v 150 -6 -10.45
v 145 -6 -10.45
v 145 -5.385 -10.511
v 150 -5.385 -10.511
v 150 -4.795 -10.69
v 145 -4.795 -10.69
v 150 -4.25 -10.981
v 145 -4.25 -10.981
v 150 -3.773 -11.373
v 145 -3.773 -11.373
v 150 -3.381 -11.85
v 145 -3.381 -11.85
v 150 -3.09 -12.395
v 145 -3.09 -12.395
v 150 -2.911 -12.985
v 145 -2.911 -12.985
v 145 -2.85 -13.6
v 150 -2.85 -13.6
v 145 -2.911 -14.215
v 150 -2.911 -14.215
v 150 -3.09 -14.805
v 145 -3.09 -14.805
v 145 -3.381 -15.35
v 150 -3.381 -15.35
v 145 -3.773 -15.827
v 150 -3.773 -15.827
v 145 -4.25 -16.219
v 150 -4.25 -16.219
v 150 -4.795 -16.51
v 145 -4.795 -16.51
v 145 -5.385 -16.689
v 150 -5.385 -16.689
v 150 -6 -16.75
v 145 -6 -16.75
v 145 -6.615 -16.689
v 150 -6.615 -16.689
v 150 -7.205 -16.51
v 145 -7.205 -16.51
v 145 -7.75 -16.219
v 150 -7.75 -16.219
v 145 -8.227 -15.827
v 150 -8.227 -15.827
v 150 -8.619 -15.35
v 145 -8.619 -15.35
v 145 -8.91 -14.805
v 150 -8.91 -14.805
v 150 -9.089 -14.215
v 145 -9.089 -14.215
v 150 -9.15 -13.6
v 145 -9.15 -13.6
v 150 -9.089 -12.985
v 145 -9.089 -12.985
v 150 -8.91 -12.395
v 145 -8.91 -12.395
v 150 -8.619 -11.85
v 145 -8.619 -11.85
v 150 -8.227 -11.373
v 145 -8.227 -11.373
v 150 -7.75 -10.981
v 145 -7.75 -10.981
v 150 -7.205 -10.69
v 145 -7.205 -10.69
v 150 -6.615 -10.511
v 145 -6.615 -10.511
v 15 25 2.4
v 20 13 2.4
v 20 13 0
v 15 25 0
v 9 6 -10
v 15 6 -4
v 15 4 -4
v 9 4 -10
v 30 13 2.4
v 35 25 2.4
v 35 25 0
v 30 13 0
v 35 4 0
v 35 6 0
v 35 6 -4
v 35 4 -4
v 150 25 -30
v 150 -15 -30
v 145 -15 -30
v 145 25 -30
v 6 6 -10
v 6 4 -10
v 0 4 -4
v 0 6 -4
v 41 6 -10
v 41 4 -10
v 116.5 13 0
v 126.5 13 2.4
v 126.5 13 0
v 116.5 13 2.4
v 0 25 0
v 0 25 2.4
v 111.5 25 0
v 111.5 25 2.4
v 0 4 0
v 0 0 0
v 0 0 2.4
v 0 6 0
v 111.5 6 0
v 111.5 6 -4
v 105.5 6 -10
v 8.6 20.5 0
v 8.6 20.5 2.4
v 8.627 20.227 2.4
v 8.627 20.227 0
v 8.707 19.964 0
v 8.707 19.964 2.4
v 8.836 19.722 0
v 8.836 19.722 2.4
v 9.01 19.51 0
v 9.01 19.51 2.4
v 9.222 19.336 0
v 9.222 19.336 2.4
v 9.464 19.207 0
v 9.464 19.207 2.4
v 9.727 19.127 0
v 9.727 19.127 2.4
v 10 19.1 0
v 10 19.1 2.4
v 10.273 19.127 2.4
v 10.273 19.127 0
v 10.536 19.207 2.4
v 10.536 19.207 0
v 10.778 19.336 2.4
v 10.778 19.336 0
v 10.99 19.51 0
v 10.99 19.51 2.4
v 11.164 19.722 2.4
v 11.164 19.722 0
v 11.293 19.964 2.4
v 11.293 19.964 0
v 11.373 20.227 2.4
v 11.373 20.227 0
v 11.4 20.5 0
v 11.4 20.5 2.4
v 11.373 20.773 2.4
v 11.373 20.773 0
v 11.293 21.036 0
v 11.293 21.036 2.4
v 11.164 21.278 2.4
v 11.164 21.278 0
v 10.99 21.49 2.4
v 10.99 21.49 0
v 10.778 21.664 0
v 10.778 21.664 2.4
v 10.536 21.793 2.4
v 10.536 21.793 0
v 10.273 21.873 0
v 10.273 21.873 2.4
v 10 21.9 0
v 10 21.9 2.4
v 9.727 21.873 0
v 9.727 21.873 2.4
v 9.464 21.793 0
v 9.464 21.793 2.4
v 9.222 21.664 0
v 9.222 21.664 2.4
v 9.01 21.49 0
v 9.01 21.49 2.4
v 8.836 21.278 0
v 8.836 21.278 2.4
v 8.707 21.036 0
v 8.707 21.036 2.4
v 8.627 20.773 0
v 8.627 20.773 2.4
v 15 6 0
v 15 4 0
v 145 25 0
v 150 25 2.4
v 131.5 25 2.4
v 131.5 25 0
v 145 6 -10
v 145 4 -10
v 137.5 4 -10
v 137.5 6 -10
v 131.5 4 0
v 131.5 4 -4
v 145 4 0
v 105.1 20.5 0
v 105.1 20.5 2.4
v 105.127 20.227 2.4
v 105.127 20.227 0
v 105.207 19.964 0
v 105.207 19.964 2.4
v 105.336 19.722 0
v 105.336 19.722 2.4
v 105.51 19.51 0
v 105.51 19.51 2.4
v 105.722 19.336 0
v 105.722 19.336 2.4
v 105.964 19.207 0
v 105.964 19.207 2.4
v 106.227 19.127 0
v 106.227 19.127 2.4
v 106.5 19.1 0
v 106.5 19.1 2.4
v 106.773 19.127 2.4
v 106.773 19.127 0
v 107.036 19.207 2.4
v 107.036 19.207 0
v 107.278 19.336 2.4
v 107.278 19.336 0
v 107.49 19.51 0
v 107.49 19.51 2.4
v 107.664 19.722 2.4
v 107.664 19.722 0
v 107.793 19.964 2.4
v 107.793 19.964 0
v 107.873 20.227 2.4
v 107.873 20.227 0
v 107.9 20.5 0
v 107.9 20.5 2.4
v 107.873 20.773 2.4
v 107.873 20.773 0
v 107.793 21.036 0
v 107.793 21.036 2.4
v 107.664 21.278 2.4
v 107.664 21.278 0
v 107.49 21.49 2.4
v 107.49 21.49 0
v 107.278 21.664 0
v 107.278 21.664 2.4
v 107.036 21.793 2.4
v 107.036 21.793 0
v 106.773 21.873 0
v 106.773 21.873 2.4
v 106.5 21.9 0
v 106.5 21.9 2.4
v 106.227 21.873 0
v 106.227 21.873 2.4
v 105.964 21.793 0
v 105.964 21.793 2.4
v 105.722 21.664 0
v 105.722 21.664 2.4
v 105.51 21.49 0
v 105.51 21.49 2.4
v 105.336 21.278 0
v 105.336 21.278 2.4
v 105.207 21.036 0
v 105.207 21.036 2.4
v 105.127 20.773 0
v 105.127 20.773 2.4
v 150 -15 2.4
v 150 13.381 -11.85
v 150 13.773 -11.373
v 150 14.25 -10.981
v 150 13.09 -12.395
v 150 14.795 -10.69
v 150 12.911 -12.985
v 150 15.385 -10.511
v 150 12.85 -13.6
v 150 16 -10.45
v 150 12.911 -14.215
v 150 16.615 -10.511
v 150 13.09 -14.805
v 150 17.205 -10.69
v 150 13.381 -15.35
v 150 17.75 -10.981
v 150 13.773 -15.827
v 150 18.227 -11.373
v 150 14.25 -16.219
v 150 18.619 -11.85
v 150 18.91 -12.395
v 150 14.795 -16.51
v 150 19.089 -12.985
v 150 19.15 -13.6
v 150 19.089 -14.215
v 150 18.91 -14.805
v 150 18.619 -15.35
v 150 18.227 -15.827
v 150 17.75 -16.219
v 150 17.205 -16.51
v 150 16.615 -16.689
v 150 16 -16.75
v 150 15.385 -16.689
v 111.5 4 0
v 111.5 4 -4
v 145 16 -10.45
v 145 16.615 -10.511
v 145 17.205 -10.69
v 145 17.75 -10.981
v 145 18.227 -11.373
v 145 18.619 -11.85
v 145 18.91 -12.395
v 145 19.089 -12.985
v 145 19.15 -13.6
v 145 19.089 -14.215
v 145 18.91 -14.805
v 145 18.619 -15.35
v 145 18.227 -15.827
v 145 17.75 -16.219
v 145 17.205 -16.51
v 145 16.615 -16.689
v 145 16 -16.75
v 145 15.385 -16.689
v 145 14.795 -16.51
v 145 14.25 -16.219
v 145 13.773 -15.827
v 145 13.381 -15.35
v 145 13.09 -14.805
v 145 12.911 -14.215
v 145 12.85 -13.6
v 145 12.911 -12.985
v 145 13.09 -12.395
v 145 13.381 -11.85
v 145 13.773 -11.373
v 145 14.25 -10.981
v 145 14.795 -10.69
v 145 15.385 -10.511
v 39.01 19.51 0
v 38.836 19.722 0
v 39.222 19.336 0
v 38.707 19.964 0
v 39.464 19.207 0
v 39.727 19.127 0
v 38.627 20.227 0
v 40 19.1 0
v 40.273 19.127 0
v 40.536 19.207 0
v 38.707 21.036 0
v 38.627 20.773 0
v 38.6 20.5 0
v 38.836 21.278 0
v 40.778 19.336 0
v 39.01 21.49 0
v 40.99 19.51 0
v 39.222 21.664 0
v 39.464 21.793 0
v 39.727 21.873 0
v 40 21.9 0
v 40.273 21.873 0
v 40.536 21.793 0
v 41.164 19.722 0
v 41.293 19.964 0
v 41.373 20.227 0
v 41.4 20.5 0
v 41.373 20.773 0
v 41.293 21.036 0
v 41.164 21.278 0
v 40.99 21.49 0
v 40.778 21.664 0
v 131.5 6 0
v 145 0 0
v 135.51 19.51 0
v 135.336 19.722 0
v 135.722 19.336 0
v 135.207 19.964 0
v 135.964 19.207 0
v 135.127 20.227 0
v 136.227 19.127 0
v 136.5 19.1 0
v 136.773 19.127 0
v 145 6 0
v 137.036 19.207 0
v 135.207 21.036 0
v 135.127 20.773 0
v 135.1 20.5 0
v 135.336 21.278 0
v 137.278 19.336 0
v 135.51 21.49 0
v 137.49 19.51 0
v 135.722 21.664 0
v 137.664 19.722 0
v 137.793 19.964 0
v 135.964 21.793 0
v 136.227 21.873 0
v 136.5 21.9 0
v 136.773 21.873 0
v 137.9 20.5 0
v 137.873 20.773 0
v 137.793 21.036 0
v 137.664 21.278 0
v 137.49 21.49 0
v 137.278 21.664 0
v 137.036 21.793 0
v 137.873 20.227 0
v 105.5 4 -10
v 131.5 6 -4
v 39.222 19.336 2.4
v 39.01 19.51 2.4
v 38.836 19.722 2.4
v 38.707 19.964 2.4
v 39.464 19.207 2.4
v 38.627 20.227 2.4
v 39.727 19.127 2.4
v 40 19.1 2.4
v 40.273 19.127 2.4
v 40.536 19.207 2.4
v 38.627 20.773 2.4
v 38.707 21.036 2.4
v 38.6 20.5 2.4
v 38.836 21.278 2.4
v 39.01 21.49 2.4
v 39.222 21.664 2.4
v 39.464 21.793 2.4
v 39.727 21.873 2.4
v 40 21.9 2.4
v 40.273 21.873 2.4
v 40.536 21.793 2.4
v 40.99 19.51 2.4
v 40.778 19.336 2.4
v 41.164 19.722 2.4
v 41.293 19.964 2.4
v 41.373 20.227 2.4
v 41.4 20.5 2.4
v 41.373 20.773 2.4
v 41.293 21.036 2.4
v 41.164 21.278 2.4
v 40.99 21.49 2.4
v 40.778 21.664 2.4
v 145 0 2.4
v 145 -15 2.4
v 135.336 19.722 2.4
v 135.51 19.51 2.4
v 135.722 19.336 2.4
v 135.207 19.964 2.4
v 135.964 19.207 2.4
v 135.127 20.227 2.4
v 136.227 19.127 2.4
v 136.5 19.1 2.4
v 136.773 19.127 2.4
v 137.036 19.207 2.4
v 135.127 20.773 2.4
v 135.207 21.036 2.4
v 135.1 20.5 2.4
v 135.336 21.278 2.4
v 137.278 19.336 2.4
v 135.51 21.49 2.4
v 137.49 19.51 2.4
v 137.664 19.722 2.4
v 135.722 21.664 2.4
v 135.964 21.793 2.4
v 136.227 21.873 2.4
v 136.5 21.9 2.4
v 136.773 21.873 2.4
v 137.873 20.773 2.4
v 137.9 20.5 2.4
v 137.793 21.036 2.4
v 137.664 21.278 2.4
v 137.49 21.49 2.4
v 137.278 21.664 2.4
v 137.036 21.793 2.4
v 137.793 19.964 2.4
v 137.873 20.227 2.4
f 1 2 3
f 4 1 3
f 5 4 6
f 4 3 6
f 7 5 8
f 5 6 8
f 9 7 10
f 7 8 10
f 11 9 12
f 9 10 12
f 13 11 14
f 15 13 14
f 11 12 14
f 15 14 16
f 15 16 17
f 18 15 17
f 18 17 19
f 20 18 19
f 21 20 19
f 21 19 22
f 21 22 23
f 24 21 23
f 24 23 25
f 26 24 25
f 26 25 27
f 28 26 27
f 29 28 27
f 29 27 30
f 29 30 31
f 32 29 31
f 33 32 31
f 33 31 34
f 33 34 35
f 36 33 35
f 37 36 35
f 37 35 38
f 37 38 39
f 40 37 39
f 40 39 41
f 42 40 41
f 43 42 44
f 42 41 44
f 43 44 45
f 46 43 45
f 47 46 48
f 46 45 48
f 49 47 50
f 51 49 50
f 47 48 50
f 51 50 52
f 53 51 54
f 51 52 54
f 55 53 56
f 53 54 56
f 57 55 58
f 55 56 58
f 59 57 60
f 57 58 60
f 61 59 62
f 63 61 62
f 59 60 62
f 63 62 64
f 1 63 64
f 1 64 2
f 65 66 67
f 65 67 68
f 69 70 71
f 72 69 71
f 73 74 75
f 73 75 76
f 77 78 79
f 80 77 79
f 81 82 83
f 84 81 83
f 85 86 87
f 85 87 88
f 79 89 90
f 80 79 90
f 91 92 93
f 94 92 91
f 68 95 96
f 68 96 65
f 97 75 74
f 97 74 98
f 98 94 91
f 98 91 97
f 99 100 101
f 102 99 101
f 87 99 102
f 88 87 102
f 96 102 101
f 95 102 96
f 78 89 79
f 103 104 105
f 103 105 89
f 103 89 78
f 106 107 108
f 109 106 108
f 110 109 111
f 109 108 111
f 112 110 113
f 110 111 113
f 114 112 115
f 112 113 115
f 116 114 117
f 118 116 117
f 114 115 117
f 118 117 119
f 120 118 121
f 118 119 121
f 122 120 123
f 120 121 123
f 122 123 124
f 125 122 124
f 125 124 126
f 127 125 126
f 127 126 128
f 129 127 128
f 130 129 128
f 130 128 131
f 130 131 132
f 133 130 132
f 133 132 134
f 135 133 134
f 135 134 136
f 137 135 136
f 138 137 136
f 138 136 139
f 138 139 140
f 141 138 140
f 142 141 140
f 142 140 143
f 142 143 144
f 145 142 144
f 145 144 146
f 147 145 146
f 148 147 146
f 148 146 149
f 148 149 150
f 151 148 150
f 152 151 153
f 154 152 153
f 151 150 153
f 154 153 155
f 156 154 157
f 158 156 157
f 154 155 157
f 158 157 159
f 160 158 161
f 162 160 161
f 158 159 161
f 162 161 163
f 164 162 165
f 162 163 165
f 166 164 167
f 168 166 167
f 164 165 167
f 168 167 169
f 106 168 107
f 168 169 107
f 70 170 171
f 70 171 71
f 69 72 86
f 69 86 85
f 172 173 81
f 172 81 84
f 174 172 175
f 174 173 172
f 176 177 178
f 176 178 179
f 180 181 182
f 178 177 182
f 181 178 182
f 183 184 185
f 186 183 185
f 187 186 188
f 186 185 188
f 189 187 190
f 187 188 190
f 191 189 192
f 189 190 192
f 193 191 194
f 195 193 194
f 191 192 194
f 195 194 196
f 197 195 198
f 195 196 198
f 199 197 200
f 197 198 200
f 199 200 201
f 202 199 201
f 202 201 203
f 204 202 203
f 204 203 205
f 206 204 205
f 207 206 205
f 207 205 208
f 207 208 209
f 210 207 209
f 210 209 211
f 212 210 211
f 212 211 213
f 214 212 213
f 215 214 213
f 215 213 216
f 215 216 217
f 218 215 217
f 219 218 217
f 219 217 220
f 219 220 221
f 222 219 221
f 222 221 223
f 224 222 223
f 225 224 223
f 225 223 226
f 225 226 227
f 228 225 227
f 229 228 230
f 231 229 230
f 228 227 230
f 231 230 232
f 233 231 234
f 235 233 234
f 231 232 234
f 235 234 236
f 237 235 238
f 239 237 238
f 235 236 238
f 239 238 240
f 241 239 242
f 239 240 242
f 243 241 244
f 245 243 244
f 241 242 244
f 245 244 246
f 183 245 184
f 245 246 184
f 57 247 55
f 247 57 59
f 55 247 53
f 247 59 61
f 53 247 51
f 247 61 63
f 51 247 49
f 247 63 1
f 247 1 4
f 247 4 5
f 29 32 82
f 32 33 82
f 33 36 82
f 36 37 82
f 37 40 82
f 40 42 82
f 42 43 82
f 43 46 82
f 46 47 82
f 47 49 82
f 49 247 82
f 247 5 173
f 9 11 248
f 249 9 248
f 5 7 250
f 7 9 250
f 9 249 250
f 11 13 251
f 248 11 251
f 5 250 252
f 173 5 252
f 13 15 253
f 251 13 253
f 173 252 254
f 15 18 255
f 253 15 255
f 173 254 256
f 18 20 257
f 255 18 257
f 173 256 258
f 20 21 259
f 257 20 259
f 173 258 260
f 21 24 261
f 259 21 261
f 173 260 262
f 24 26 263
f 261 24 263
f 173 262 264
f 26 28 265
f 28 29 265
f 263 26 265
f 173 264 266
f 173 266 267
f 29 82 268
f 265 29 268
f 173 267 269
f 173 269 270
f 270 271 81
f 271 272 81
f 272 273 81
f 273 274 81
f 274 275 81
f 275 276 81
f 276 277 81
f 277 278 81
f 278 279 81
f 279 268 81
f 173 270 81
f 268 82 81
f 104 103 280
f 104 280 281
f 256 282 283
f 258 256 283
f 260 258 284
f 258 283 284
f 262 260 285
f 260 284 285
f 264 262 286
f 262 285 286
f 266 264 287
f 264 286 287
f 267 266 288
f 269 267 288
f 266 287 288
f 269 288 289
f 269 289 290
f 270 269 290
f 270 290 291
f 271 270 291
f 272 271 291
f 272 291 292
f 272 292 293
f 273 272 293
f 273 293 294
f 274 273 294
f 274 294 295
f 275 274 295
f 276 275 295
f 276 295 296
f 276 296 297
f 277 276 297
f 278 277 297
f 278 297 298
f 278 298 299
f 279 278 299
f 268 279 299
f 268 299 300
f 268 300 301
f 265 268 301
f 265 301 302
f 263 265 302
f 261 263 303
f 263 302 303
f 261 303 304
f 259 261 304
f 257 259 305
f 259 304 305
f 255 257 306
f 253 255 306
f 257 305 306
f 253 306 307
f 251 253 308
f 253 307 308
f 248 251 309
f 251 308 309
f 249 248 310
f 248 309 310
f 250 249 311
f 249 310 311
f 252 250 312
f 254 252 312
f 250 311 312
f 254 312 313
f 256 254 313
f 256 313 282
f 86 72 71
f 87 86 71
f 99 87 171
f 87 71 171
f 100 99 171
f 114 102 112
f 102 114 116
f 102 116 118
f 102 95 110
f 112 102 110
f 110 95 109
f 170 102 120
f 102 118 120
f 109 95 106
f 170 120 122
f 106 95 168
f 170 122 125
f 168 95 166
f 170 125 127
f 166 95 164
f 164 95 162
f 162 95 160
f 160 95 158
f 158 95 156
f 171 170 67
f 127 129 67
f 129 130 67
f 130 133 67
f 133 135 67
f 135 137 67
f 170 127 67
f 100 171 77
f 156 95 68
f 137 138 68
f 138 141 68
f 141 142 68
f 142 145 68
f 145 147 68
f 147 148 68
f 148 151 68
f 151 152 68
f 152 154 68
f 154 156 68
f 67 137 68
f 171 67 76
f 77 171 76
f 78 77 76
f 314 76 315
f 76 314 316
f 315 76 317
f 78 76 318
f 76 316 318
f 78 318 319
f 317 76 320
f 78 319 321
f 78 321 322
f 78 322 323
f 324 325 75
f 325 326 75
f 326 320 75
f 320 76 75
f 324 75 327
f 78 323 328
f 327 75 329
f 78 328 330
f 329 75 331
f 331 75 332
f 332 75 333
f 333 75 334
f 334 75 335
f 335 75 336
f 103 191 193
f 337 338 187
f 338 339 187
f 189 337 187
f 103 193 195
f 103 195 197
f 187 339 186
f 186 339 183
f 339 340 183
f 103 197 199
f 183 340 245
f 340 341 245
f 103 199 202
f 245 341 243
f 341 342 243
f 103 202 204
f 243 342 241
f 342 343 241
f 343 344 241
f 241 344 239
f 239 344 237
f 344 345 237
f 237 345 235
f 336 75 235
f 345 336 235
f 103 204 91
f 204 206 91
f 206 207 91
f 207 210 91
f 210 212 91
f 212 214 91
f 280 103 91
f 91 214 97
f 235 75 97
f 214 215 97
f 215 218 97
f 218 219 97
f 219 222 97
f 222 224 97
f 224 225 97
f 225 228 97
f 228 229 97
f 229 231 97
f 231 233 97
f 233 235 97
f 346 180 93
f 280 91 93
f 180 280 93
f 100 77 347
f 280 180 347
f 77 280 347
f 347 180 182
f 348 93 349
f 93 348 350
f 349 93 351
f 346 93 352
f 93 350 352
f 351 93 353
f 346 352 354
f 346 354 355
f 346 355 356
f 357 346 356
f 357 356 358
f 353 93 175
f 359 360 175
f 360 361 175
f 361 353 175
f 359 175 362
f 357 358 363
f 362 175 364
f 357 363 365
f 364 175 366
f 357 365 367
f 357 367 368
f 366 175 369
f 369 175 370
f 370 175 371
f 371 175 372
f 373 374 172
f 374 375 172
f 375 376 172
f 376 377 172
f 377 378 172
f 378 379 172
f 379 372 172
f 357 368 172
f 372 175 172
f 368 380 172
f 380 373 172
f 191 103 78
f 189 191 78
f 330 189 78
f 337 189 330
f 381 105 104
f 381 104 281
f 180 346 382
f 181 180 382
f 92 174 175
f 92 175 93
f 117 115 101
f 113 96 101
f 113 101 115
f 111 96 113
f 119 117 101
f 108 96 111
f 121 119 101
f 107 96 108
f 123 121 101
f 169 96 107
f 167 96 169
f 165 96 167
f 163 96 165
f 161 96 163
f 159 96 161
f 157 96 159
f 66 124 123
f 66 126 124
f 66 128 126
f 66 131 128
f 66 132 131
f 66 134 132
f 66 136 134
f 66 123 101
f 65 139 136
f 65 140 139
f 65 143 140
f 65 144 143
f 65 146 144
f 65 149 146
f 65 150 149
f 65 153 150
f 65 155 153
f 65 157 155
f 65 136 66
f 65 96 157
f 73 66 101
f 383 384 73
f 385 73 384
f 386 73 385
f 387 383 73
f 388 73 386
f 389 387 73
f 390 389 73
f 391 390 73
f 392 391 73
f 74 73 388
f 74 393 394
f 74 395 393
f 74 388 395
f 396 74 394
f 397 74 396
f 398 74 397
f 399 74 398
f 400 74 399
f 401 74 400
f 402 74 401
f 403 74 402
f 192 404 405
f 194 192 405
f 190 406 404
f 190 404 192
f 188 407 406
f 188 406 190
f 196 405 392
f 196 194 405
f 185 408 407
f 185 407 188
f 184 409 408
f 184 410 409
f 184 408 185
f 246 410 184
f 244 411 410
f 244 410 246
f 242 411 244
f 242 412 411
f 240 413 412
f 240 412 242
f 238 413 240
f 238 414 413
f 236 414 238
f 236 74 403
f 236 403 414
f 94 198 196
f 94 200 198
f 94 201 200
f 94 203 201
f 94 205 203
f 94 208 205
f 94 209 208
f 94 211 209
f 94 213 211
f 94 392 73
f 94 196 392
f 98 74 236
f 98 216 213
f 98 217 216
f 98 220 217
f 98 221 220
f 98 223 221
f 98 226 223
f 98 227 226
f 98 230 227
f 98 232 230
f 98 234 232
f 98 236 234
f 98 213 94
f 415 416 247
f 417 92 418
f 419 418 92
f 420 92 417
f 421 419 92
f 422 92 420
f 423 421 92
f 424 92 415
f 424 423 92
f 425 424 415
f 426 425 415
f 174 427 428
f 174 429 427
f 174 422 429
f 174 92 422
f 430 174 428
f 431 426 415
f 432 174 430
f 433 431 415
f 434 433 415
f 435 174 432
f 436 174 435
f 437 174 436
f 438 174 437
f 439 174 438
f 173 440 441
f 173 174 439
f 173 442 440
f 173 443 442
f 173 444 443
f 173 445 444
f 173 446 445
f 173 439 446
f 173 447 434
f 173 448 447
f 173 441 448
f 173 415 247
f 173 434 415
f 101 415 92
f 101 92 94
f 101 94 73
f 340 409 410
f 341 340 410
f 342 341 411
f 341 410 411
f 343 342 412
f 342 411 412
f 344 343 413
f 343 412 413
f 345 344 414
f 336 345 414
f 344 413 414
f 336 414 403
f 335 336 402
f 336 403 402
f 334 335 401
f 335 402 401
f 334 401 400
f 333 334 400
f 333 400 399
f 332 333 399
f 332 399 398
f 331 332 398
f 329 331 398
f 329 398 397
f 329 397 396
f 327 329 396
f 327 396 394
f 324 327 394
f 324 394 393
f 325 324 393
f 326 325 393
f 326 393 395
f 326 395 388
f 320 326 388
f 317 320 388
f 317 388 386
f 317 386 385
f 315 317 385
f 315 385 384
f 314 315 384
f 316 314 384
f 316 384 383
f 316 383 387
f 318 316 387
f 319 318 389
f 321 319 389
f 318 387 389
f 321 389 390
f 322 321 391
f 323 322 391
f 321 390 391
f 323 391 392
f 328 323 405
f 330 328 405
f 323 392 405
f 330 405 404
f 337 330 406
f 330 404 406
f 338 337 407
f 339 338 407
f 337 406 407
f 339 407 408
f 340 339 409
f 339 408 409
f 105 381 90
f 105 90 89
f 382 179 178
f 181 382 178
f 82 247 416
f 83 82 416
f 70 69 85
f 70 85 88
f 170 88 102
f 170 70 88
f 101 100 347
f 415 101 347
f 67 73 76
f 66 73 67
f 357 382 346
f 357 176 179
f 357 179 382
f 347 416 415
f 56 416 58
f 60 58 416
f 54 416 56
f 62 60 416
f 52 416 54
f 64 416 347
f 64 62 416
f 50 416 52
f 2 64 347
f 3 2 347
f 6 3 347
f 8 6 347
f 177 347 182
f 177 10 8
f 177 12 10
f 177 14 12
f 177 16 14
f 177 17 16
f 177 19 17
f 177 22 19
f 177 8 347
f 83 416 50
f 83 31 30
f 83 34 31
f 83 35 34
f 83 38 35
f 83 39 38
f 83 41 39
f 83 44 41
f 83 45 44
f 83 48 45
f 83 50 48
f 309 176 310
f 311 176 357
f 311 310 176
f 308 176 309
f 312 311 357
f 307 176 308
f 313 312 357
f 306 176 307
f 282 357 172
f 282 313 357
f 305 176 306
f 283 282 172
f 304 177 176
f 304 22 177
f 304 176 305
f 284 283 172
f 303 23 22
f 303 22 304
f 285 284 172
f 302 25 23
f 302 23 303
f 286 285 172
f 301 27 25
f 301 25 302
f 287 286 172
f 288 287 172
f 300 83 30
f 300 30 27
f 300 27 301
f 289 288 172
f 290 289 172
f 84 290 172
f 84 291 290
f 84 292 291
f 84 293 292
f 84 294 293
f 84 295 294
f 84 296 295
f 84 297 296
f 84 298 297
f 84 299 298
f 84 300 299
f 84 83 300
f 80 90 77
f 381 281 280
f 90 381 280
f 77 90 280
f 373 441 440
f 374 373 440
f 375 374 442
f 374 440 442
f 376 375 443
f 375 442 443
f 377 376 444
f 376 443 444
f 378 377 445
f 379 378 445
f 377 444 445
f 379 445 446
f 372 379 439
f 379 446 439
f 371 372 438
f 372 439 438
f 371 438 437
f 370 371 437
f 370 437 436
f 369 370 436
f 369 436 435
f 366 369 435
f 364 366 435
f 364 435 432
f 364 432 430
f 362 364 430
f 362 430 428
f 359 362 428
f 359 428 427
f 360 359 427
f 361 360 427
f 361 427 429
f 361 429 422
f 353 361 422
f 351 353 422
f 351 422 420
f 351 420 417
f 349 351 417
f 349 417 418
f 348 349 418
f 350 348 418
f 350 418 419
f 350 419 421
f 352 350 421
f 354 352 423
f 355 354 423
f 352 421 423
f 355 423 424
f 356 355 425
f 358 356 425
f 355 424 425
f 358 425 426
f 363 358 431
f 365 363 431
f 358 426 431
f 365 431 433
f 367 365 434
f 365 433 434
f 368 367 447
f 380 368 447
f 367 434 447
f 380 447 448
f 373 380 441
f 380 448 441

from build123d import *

# Parameters (mm, degrees)
SKETCH1_W                       = 150
SKETCH1_H                       = 25
BOSS_EXTRUDE1_DEPTH             = 2.4
SKETCH2_R                       = 1.4
CUT_EXTRUDE1_DEPTH              = 153.088000842
SKETCH3_W                       = 5
SKETCH3_H                       = 40
BOSS_EXTRUDE2_DEPTH             = 30
BOSS_EXTRUDE2_DIRECTION_2_REACH = 154.088
SKETCH4_R                       = 3.15
CUT_EXTRUDE2_DEPTH              = 30
SKETCH8_W                       = 10
SKETCH8_H                       = 2
BOSS_EXTRUDE4_DEPTH             = 145
SKETCH9_W                       = 20
SKETCH9_H                       = 12.540874848
SKETCH9_H_2                     = 13.006860614
CUT_EXTRUDE4_DEPTH              = 159.113883008
CHAMFER5_SIZE                   = 6


with BuildPart() as part:
    # Sketch1 → Boss-Extrude1 (new body)
    with BuildSketch(Plane.XY):
        with Locations((75, 12.5)):
            Rectangle(SKETCH1_W, SKETCH1_H)
    extrude(amount=BOSS_EXTRUDE1_DEPTH)

    # Sketch2 → Cut-Extrude1 (cut, through all)
    with BuildSketch(Plane.XY.offset(2.4)):
        with Locations((40, 20.5)):
            Circle(SKETCH2_R)
        with Locations(Location((10, 20.5, 0), (0, 0, 180))):
            Circle(SKETCH2_R)
        with Locations(Location((106.5, 20.5, 0), (0, 0, 180))):
            Circle(SKETCH2_R)
        with Locations((136.5, 20.5)):
            Circle(SKETCH2_R)
        Polygon((131.5, 25), (126.5, 13), (116.5, 13), (111.5, 25), align=None)
        Polygon((35, 25), (30, 13), (20, 13), (15, 25), align=None)
    extrude(amount=-CUT_EXTRUDE1_DEPTH, mode=Mode.SUBTRACT)

    # Sketch3 → Boss-Extrude2 (add)
    with BuildSketch(Plane(origin=(0, 0, 0), x_dir=(-1, 0, 0), z_dir=(0, 0, -1))):
        with Locations((-147.5, 5)):
            Rectangle(SKETCH3_W, SKETCH3_H)
    extrude(amount=BOSS_EXTRUDE2_DEPTH)

    # Boss-Extrude2 direction 2: up to this face of the body (flat: up to its plane)
    boss_extrude2_direction_2_end = Plane(part.part.faces().sort_by_distance((75.200008519, 11.67481859, 2.4))[0])
    # Sketch3 → Boss-Extrude2 direction 2 (add, up to the picked face)
    with BuildSketch(Plane(origin=(0, 0, 0), x_dir=(-1, 0, 0), z_dir=(0, 0, -1)), mode=Mode.PRIVATE) as boss_extrude2_direction_2_sk1:
        with Locations((-147.5, 5)):
            Rectangle(SKETCH3_W, SKETCH3_H)
    boss_extrude2_direction_2_tool1 = split(extrude(boss_extrude2_direction_2_sk1.sketch, amount=-BOSS_EXTRUDE2_DIRECTION_2_REACH, mode=Mode.PRIVATE), bisect_by=boss_extrude2_direction_2_end, keep=Keep.BOTH, mode=Mode.PRIVATE)
    add(boss_extrude2_direction_2_tool1.solids().sort_by(Axis((147.5, 5, 0), (0, 0, 1)))[0])

    # Sketch4 → Cut-Extrude2 (cut)
    with BuildSketch(Plane.ZY.offset(-145)):
        with Locations((-13.6, 16)):
            Circle(SKETCH4_R)
        with Locations((-13.6, -6)):
            Circle(SKETCH4_R)
    extrude(amount=-CUT_EXTRUDE2_DEPTH, mode=Mode.SUBTRACT)

    # Sketch8 → Boss-Extrude4 (add)
    with BuildSketch(Plane.ZY.offset(-145)):
        with Locations((-5, 5)):
            Rectangle(SKETCH8_W, SKETCH8_H)
    extrude(amount=BOSS_EXTRUDE4_DEPTH)

    # Sketch9 → Cut-Extrude4 (cut, through all)
    with BuildSketch(Plane(origin=(0, 25, 0), x_dir=(1, 0, 0), z_dir=(0, 1, 0))):
        with Locations((121.5, 6.270437424)):
            Rectangle(SKETCH9_W, SKETCH9_H)
        with Locations((25, 6.503430307)):
            Rectangle(SKETCH9_W, SKETCH9_H_2)
    extrude(amount=-CUT_EXTRUDE4_DEPTH, mode=Mode.SUBTRACT)

    # Chamfer5
    chamfer5_edges = [part.edges().sort_by_distance(p)[0] for p in [
        (111.5, 5, -10),
        (131.5, 5, -10),
        (15, 5, -10),
        (35, 5, -10),
        (0, 5, -10),
    ]]
    chamfer(chamfer5_edges, length=CHAMFER5_SIZE)


solid = part.part
